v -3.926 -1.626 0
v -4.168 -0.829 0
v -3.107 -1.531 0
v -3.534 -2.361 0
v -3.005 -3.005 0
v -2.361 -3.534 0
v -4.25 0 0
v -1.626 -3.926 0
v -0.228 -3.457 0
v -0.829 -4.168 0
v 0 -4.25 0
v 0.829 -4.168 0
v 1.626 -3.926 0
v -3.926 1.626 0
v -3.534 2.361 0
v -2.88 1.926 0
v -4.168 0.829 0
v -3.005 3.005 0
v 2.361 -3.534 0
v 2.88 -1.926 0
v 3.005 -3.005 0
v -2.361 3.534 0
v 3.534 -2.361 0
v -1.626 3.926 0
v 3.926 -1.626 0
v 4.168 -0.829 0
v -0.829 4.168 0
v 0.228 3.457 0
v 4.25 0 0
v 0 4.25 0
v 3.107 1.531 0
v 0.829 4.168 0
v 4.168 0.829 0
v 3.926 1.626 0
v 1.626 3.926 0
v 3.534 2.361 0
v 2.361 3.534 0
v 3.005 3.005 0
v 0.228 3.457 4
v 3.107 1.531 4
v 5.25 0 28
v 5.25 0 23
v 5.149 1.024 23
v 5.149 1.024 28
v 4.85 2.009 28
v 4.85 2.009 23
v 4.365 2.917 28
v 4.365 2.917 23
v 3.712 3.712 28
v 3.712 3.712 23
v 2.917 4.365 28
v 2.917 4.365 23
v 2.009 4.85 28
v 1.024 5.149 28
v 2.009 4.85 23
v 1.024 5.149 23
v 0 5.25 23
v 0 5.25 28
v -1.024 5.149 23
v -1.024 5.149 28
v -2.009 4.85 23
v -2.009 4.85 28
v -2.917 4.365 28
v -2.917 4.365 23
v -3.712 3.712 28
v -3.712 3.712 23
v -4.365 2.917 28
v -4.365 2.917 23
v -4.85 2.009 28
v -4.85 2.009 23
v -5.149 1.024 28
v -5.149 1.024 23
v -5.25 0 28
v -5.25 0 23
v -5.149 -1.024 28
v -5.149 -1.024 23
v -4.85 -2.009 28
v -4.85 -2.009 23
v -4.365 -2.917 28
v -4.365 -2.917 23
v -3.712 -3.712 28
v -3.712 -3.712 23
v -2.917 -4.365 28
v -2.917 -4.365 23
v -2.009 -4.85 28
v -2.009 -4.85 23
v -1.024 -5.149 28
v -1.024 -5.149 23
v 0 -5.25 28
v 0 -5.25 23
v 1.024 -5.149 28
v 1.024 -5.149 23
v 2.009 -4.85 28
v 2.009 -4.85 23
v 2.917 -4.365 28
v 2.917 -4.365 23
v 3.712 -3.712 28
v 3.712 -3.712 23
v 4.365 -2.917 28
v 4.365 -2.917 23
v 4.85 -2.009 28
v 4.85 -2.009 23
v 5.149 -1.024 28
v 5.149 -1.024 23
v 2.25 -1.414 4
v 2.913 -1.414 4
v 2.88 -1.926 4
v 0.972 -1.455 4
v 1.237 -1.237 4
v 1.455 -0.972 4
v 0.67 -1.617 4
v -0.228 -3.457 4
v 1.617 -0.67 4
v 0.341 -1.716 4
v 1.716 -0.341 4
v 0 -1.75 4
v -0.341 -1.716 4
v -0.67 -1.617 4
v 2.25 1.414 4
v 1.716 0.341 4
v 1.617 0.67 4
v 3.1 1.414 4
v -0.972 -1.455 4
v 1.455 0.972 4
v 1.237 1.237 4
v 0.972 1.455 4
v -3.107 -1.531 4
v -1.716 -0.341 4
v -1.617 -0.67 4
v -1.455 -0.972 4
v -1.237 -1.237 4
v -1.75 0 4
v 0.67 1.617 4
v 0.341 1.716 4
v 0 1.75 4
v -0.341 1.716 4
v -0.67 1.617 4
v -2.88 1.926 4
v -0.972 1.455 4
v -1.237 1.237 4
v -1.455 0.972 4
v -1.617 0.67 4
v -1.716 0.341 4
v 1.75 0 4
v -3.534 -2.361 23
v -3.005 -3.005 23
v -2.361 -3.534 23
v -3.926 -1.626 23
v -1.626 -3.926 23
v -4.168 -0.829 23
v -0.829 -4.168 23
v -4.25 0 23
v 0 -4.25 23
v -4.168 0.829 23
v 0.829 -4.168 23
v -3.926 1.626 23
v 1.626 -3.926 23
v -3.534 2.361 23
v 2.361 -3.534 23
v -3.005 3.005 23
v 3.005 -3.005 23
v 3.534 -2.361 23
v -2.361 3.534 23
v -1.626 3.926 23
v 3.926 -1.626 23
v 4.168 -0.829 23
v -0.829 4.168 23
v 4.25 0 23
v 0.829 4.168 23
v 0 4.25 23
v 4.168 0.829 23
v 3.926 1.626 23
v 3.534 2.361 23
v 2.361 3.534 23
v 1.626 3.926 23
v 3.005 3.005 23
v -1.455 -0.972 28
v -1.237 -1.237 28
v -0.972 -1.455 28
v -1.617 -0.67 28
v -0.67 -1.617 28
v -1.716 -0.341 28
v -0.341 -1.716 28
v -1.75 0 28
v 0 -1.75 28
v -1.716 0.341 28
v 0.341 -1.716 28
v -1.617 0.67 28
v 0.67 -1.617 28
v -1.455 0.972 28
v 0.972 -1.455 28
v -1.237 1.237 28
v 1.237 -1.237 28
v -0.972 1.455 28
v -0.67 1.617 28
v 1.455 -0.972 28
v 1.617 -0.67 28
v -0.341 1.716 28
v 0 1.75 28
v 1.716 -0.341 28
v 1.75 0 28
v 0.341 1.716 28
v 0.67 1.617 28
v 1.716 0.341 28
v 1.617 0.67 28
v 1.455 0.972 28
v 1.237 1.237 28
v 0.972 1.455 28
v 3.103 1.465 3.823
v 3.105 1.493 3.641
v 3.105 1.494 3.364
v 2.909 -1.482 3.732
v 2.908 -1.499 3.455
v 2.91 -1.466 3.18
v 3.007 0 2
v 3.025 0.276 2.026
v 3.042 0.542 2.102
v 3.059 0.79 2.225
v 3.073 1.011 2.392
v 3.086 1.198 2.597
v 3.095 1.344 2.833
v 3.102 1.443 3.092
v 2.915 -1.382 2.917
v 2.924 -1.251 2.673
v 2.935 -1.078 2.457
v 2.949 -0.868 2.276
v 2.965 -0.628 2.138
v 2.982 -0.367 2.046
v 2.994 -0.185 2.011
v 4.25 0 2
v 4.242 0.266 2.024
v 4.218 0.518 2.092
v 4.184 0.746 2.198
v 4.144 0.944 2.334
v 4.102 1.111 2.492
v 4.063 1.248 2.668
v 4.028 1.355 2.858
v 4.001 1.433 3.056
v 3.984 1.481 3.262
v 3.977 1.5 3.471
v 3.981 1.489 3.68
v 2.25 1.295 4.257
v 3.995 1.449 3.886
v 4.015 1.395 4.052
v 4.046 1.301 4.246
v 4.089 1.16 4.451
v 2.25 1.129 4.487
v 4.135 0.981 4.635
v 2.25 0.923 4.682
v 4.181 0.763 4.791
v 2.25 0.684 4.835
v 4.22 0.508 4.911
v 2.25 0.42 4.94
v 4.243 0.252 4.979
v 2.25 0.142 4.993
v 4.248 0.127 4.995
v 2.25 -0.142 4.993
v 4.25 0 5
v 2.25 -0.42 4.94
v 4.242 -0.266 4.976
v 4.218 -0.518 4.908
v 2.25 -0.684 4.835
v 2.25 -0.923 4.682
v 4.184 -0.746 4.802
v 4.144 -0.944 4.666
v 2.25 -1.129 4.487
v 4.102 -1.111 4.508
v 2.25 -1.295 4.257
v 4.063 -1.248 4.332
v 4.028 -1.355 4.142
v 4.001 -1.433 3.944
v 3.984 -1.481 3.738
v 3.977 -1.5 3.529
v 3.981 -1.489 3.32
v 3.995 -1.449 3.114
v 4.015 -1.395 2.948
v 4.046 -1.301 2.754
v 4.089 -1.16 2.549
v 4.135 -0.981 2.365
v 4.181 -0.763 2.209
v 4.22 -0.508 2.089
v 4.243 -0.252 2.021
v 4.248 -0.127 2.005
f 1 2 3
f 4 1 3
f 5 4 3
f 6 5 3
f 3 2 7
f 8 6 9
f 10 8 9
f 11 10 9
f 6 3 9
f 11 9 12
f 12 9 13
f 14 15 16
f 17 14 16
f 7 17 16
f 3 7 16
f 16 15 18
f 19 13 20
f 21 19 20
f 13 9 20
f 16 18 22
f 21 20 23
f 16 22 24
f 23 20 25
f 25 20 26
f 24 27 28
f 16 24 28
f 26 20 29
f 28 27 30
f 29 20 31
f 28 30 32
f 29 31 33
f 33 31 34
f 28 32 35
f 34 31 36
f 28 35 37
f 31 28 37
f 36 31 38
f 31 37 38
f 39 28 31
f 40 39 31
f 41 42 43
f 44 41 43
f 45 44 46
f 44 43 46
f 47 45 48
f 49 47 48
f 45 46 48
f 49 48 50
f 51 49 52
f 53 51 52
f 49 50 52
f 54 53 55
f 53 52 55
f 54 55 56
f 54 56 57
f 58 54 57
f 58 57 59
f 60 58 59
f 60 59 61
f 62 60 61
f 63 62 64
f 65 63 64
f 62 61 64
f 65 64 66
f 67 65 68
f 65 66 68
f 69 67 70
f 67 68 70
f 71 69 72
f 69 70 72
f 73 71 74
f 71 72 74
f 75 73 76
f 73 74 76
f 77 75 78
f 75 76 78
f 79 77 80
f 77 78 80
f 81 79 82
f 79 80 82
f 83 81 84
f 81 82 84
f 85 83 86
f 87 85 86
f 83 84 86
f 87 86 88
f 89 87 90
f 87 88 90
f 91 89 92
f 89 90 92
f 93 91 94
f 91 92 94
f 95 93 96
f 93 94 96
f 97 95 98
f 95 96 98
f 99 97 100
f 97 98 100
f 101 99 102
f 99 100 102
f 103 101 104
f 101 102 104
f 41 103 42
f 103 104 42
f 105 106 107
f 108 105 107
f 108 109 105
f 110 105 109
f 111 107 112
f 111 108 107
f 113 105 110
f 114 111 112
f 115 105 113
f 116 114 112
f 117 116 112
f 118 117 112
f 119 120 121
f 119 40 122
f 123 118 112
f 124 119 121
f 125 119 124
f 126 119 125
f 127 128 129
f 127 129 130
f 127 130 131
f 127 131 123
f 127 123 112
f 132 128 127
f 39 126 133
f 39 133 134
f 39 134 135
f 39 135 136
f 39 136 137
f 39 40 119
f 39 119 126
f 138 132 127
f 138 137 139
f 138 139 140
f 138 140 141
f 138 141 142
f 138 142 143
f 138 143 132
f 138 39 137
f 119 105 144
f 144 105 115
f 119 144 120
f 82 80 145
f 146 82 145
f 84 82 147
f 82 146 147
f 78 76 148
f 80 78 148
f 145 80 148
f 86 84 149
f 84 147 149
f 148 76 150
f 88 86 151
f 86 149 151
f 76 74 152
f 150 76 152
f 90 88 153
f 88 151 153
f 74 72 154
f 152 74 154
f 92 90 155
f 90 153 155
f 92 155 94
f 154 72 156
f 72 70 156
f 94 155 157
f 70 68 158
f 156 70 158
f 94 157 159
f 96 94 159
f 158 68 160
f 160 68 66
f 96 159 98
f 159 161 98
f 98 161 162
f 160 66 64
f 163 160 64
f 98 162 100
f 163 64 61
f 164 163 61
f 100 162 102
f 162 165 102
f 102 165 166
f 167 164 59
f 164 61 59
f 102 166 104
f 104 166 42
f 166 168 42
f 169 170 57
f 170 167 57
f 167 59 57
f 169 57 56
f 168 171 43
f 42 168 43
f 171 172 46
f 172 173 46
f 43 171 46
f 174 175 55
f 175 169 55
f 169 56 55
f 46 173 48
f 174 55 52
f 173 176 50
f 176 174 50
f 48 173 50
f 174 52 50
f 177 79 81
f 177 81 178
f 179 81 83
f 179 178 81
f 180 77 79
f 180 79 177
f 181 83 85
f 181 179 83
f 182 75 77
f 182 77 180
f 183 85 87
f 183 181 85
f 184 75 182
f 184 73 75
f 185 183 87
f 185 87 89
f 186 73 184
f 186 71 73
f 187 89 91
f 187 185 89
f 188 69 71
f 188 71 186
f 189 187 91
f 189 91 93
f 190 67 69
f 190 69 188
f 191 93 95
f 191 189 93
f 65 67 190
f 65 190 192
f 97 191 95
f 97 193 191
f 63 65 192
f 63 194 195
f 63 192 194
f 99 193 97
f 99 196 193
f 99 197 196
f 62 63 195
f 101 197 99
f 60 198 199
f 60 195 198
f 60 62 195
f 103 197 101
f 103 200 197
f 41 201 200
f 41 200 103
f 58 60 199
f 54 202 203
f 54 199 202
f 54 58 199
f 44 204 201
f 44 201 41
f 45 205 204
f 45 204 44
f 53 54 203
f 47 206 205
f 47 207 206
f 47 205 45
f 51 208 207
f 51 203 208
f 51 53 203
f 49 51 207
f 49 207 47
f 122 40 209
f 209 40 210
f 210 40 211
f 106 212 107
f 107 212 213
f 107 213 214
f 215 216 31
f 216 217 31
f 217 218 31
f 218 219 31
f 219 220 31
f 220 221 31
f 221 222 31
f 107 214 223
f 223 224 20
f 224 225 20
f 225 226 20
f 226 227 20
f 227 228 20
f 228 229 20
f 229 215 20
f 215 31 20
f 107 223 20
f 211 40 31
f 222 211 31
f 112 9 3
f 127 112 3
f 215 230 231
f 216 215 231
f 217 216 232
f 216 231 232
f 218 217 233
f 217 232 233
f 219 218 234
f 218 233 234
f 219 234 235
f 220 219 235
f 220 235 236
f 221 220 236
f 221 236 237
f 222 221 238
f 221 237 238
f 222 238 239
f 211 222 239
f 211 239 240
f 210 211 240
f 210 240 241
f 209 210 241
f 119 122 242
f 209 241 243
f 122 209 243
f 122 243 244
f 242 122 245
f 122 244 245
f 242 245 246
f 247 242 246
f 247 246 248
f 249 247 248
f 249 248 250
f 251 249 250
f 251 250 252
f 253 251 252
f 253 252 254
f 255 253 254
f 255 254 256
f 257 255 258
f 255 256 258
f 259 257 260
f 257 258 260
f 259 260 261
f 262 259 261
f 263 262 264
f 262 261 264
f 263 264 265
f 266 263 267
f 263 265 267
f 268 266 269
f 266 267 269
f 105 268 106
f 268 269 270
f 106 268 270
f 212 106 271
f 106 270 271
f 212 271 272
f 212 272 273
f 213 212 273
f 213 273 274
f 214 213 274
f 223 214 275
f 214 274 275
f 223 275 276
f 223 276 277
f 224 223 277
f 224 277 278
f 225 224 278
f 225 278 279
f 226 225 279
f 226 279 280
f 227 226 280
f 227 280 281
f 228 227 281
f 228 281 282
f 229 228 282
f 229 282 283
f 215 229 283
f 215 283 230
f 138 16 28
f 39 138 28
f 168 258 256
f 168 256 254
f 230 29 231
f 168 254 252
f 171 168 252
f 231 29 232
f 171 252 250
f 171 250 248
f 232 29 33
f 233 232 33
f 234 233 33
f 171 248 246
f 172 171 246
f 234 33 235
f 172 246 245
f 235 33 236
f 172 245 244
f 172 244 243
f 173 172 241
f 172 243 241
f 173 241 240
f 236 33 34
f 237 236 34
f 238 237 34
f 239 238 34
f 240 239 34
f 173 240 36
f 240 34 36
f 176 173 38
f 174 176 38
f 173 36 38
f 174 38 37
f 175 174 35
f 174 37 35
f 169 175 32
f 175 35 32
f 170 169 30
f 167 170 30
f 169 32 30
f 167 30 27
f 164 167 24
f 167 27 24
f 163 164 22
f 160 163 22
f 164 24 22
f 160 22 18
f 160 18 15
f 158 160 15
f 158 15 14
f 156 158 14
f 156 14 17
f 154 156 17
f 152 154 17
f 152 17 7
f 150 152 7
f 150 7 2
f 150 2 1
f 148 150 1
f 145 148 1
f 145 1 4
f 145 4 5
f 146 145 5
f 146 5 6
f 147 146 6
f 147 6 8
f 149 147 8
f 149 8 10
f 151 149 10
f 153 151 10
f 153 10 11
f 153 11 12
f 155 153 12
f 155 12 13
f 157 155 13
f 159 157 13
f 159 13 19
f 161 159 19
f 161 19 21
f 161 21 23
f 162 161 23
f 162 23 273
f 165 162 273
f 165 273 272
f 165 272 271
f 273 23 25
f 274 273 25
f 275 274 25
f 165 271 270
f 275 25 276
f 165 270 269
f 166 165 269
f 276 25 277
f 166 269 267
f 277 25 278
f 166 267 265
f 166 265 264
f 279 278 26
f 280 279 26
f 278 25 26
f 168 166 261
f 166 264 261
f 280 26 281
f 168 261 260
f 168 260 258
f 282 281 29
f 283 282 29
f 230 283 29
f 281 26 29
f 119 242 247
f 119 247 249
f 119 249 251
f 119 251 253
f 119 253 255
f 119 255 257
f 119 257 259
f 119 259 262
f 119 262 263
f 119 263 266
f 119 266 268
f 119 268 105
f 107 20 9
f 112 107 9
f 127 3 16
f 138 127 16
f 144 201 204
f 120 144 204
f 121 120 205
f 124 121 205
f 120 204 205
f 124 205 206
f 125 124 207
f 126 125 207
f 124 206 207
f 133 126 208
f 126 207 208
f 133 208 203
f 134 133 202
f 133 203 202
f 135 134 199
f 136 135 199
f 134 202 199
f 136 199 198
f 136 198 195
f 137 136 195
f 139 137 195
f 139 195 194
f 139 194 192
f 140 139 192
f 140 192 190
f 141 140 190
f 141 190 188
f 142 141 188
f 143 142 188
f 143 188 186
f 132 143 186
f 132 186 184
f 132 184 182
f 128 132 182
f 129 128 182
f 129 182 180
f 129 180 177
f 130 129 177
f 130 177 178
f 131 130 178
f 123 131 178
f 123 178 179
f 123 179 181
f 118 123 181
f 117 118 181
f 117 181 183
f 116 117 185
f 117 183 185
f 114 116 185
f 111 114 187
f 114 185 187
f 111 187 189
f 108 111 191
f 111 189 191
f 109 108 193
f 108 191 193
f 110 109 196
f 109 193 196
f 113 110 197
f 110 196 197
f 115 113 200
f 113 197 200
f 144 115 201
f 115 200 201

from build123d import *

# Parameters (mm, degrees)
SKETCH1_R           = 4.25
BOSS_EXTRUDE1_DEPTH = 23
SKETCH2_R           = 5.25
BOSS_EXTRUDE2_DEPTH = 5
SKETCH6_R           = 1.5
CUT_EXTRUDE3_DEPTH  = 2
SKETCH7_R           = 1.75
CUT_EXTRUDE4_DEPTH  = 29.0000001
CUT_EXTRUDE5_DEPTH  = 4


with BuildPart() as part:
    # Sketch1 → Boss-Extrude1 (new body)
    with BuildSketch(Plane.XY):
        Circle(SKETCH1_R)
    extrude(amount=BOSS_EXTRUDE1_DEPTH)

    # Sketch2 → Boss-Extrude2 (add)
    with BuildSketch(Plane.XY.offset(23)):
        Circle(SKETCH2_R)
    extrude(amount=BOSS_EXTRUDE2_DEPTH)

    # Sketch6 → Cut-Extrude3 (cut)
    with BuildSketch(Plane(origin=(4.25, 0, 0), x_dir=(0, 0, -1), z_dir=(1, 0, 0))):
        with Locations((-3.5, 0)):
            Circle(SKETCH6_R)
    extrude(amount=-CUT_EXTRUDE3_DEPTH, mode=Mode.SUBTRACT)

    # Sketch7 → Cut-Extrude4 (cut, through all)
    with BuildSketch(Plane.XY.offset(28)):
        Circle(SKETCH7_R)
    extrude(amount=-CUT_EXTRUDE4_DEPTH, mode=Mode.SUBTRACT)

    # Sketch8 → Cut-Extrude5 (cut)
    with BuildSketch(Plane(origin=(0, 0, 0), x_dir=(-1, 0, 0), z_dir=(0, 0, -1))):
        Polygon((-0.22790745, 3.456596331), (-3.107453958, 1.530924524), (-2.879546508, -1.925671807), (0.22790745, -3.456596331), (3.107453958, -1.530924524), (2.879546508, 1.925671807), align=None)
    extrude(amount=-CUT_EXTRUDE5_DEPTH, mode=Mode.SUBTRACT)


solid = part.part
